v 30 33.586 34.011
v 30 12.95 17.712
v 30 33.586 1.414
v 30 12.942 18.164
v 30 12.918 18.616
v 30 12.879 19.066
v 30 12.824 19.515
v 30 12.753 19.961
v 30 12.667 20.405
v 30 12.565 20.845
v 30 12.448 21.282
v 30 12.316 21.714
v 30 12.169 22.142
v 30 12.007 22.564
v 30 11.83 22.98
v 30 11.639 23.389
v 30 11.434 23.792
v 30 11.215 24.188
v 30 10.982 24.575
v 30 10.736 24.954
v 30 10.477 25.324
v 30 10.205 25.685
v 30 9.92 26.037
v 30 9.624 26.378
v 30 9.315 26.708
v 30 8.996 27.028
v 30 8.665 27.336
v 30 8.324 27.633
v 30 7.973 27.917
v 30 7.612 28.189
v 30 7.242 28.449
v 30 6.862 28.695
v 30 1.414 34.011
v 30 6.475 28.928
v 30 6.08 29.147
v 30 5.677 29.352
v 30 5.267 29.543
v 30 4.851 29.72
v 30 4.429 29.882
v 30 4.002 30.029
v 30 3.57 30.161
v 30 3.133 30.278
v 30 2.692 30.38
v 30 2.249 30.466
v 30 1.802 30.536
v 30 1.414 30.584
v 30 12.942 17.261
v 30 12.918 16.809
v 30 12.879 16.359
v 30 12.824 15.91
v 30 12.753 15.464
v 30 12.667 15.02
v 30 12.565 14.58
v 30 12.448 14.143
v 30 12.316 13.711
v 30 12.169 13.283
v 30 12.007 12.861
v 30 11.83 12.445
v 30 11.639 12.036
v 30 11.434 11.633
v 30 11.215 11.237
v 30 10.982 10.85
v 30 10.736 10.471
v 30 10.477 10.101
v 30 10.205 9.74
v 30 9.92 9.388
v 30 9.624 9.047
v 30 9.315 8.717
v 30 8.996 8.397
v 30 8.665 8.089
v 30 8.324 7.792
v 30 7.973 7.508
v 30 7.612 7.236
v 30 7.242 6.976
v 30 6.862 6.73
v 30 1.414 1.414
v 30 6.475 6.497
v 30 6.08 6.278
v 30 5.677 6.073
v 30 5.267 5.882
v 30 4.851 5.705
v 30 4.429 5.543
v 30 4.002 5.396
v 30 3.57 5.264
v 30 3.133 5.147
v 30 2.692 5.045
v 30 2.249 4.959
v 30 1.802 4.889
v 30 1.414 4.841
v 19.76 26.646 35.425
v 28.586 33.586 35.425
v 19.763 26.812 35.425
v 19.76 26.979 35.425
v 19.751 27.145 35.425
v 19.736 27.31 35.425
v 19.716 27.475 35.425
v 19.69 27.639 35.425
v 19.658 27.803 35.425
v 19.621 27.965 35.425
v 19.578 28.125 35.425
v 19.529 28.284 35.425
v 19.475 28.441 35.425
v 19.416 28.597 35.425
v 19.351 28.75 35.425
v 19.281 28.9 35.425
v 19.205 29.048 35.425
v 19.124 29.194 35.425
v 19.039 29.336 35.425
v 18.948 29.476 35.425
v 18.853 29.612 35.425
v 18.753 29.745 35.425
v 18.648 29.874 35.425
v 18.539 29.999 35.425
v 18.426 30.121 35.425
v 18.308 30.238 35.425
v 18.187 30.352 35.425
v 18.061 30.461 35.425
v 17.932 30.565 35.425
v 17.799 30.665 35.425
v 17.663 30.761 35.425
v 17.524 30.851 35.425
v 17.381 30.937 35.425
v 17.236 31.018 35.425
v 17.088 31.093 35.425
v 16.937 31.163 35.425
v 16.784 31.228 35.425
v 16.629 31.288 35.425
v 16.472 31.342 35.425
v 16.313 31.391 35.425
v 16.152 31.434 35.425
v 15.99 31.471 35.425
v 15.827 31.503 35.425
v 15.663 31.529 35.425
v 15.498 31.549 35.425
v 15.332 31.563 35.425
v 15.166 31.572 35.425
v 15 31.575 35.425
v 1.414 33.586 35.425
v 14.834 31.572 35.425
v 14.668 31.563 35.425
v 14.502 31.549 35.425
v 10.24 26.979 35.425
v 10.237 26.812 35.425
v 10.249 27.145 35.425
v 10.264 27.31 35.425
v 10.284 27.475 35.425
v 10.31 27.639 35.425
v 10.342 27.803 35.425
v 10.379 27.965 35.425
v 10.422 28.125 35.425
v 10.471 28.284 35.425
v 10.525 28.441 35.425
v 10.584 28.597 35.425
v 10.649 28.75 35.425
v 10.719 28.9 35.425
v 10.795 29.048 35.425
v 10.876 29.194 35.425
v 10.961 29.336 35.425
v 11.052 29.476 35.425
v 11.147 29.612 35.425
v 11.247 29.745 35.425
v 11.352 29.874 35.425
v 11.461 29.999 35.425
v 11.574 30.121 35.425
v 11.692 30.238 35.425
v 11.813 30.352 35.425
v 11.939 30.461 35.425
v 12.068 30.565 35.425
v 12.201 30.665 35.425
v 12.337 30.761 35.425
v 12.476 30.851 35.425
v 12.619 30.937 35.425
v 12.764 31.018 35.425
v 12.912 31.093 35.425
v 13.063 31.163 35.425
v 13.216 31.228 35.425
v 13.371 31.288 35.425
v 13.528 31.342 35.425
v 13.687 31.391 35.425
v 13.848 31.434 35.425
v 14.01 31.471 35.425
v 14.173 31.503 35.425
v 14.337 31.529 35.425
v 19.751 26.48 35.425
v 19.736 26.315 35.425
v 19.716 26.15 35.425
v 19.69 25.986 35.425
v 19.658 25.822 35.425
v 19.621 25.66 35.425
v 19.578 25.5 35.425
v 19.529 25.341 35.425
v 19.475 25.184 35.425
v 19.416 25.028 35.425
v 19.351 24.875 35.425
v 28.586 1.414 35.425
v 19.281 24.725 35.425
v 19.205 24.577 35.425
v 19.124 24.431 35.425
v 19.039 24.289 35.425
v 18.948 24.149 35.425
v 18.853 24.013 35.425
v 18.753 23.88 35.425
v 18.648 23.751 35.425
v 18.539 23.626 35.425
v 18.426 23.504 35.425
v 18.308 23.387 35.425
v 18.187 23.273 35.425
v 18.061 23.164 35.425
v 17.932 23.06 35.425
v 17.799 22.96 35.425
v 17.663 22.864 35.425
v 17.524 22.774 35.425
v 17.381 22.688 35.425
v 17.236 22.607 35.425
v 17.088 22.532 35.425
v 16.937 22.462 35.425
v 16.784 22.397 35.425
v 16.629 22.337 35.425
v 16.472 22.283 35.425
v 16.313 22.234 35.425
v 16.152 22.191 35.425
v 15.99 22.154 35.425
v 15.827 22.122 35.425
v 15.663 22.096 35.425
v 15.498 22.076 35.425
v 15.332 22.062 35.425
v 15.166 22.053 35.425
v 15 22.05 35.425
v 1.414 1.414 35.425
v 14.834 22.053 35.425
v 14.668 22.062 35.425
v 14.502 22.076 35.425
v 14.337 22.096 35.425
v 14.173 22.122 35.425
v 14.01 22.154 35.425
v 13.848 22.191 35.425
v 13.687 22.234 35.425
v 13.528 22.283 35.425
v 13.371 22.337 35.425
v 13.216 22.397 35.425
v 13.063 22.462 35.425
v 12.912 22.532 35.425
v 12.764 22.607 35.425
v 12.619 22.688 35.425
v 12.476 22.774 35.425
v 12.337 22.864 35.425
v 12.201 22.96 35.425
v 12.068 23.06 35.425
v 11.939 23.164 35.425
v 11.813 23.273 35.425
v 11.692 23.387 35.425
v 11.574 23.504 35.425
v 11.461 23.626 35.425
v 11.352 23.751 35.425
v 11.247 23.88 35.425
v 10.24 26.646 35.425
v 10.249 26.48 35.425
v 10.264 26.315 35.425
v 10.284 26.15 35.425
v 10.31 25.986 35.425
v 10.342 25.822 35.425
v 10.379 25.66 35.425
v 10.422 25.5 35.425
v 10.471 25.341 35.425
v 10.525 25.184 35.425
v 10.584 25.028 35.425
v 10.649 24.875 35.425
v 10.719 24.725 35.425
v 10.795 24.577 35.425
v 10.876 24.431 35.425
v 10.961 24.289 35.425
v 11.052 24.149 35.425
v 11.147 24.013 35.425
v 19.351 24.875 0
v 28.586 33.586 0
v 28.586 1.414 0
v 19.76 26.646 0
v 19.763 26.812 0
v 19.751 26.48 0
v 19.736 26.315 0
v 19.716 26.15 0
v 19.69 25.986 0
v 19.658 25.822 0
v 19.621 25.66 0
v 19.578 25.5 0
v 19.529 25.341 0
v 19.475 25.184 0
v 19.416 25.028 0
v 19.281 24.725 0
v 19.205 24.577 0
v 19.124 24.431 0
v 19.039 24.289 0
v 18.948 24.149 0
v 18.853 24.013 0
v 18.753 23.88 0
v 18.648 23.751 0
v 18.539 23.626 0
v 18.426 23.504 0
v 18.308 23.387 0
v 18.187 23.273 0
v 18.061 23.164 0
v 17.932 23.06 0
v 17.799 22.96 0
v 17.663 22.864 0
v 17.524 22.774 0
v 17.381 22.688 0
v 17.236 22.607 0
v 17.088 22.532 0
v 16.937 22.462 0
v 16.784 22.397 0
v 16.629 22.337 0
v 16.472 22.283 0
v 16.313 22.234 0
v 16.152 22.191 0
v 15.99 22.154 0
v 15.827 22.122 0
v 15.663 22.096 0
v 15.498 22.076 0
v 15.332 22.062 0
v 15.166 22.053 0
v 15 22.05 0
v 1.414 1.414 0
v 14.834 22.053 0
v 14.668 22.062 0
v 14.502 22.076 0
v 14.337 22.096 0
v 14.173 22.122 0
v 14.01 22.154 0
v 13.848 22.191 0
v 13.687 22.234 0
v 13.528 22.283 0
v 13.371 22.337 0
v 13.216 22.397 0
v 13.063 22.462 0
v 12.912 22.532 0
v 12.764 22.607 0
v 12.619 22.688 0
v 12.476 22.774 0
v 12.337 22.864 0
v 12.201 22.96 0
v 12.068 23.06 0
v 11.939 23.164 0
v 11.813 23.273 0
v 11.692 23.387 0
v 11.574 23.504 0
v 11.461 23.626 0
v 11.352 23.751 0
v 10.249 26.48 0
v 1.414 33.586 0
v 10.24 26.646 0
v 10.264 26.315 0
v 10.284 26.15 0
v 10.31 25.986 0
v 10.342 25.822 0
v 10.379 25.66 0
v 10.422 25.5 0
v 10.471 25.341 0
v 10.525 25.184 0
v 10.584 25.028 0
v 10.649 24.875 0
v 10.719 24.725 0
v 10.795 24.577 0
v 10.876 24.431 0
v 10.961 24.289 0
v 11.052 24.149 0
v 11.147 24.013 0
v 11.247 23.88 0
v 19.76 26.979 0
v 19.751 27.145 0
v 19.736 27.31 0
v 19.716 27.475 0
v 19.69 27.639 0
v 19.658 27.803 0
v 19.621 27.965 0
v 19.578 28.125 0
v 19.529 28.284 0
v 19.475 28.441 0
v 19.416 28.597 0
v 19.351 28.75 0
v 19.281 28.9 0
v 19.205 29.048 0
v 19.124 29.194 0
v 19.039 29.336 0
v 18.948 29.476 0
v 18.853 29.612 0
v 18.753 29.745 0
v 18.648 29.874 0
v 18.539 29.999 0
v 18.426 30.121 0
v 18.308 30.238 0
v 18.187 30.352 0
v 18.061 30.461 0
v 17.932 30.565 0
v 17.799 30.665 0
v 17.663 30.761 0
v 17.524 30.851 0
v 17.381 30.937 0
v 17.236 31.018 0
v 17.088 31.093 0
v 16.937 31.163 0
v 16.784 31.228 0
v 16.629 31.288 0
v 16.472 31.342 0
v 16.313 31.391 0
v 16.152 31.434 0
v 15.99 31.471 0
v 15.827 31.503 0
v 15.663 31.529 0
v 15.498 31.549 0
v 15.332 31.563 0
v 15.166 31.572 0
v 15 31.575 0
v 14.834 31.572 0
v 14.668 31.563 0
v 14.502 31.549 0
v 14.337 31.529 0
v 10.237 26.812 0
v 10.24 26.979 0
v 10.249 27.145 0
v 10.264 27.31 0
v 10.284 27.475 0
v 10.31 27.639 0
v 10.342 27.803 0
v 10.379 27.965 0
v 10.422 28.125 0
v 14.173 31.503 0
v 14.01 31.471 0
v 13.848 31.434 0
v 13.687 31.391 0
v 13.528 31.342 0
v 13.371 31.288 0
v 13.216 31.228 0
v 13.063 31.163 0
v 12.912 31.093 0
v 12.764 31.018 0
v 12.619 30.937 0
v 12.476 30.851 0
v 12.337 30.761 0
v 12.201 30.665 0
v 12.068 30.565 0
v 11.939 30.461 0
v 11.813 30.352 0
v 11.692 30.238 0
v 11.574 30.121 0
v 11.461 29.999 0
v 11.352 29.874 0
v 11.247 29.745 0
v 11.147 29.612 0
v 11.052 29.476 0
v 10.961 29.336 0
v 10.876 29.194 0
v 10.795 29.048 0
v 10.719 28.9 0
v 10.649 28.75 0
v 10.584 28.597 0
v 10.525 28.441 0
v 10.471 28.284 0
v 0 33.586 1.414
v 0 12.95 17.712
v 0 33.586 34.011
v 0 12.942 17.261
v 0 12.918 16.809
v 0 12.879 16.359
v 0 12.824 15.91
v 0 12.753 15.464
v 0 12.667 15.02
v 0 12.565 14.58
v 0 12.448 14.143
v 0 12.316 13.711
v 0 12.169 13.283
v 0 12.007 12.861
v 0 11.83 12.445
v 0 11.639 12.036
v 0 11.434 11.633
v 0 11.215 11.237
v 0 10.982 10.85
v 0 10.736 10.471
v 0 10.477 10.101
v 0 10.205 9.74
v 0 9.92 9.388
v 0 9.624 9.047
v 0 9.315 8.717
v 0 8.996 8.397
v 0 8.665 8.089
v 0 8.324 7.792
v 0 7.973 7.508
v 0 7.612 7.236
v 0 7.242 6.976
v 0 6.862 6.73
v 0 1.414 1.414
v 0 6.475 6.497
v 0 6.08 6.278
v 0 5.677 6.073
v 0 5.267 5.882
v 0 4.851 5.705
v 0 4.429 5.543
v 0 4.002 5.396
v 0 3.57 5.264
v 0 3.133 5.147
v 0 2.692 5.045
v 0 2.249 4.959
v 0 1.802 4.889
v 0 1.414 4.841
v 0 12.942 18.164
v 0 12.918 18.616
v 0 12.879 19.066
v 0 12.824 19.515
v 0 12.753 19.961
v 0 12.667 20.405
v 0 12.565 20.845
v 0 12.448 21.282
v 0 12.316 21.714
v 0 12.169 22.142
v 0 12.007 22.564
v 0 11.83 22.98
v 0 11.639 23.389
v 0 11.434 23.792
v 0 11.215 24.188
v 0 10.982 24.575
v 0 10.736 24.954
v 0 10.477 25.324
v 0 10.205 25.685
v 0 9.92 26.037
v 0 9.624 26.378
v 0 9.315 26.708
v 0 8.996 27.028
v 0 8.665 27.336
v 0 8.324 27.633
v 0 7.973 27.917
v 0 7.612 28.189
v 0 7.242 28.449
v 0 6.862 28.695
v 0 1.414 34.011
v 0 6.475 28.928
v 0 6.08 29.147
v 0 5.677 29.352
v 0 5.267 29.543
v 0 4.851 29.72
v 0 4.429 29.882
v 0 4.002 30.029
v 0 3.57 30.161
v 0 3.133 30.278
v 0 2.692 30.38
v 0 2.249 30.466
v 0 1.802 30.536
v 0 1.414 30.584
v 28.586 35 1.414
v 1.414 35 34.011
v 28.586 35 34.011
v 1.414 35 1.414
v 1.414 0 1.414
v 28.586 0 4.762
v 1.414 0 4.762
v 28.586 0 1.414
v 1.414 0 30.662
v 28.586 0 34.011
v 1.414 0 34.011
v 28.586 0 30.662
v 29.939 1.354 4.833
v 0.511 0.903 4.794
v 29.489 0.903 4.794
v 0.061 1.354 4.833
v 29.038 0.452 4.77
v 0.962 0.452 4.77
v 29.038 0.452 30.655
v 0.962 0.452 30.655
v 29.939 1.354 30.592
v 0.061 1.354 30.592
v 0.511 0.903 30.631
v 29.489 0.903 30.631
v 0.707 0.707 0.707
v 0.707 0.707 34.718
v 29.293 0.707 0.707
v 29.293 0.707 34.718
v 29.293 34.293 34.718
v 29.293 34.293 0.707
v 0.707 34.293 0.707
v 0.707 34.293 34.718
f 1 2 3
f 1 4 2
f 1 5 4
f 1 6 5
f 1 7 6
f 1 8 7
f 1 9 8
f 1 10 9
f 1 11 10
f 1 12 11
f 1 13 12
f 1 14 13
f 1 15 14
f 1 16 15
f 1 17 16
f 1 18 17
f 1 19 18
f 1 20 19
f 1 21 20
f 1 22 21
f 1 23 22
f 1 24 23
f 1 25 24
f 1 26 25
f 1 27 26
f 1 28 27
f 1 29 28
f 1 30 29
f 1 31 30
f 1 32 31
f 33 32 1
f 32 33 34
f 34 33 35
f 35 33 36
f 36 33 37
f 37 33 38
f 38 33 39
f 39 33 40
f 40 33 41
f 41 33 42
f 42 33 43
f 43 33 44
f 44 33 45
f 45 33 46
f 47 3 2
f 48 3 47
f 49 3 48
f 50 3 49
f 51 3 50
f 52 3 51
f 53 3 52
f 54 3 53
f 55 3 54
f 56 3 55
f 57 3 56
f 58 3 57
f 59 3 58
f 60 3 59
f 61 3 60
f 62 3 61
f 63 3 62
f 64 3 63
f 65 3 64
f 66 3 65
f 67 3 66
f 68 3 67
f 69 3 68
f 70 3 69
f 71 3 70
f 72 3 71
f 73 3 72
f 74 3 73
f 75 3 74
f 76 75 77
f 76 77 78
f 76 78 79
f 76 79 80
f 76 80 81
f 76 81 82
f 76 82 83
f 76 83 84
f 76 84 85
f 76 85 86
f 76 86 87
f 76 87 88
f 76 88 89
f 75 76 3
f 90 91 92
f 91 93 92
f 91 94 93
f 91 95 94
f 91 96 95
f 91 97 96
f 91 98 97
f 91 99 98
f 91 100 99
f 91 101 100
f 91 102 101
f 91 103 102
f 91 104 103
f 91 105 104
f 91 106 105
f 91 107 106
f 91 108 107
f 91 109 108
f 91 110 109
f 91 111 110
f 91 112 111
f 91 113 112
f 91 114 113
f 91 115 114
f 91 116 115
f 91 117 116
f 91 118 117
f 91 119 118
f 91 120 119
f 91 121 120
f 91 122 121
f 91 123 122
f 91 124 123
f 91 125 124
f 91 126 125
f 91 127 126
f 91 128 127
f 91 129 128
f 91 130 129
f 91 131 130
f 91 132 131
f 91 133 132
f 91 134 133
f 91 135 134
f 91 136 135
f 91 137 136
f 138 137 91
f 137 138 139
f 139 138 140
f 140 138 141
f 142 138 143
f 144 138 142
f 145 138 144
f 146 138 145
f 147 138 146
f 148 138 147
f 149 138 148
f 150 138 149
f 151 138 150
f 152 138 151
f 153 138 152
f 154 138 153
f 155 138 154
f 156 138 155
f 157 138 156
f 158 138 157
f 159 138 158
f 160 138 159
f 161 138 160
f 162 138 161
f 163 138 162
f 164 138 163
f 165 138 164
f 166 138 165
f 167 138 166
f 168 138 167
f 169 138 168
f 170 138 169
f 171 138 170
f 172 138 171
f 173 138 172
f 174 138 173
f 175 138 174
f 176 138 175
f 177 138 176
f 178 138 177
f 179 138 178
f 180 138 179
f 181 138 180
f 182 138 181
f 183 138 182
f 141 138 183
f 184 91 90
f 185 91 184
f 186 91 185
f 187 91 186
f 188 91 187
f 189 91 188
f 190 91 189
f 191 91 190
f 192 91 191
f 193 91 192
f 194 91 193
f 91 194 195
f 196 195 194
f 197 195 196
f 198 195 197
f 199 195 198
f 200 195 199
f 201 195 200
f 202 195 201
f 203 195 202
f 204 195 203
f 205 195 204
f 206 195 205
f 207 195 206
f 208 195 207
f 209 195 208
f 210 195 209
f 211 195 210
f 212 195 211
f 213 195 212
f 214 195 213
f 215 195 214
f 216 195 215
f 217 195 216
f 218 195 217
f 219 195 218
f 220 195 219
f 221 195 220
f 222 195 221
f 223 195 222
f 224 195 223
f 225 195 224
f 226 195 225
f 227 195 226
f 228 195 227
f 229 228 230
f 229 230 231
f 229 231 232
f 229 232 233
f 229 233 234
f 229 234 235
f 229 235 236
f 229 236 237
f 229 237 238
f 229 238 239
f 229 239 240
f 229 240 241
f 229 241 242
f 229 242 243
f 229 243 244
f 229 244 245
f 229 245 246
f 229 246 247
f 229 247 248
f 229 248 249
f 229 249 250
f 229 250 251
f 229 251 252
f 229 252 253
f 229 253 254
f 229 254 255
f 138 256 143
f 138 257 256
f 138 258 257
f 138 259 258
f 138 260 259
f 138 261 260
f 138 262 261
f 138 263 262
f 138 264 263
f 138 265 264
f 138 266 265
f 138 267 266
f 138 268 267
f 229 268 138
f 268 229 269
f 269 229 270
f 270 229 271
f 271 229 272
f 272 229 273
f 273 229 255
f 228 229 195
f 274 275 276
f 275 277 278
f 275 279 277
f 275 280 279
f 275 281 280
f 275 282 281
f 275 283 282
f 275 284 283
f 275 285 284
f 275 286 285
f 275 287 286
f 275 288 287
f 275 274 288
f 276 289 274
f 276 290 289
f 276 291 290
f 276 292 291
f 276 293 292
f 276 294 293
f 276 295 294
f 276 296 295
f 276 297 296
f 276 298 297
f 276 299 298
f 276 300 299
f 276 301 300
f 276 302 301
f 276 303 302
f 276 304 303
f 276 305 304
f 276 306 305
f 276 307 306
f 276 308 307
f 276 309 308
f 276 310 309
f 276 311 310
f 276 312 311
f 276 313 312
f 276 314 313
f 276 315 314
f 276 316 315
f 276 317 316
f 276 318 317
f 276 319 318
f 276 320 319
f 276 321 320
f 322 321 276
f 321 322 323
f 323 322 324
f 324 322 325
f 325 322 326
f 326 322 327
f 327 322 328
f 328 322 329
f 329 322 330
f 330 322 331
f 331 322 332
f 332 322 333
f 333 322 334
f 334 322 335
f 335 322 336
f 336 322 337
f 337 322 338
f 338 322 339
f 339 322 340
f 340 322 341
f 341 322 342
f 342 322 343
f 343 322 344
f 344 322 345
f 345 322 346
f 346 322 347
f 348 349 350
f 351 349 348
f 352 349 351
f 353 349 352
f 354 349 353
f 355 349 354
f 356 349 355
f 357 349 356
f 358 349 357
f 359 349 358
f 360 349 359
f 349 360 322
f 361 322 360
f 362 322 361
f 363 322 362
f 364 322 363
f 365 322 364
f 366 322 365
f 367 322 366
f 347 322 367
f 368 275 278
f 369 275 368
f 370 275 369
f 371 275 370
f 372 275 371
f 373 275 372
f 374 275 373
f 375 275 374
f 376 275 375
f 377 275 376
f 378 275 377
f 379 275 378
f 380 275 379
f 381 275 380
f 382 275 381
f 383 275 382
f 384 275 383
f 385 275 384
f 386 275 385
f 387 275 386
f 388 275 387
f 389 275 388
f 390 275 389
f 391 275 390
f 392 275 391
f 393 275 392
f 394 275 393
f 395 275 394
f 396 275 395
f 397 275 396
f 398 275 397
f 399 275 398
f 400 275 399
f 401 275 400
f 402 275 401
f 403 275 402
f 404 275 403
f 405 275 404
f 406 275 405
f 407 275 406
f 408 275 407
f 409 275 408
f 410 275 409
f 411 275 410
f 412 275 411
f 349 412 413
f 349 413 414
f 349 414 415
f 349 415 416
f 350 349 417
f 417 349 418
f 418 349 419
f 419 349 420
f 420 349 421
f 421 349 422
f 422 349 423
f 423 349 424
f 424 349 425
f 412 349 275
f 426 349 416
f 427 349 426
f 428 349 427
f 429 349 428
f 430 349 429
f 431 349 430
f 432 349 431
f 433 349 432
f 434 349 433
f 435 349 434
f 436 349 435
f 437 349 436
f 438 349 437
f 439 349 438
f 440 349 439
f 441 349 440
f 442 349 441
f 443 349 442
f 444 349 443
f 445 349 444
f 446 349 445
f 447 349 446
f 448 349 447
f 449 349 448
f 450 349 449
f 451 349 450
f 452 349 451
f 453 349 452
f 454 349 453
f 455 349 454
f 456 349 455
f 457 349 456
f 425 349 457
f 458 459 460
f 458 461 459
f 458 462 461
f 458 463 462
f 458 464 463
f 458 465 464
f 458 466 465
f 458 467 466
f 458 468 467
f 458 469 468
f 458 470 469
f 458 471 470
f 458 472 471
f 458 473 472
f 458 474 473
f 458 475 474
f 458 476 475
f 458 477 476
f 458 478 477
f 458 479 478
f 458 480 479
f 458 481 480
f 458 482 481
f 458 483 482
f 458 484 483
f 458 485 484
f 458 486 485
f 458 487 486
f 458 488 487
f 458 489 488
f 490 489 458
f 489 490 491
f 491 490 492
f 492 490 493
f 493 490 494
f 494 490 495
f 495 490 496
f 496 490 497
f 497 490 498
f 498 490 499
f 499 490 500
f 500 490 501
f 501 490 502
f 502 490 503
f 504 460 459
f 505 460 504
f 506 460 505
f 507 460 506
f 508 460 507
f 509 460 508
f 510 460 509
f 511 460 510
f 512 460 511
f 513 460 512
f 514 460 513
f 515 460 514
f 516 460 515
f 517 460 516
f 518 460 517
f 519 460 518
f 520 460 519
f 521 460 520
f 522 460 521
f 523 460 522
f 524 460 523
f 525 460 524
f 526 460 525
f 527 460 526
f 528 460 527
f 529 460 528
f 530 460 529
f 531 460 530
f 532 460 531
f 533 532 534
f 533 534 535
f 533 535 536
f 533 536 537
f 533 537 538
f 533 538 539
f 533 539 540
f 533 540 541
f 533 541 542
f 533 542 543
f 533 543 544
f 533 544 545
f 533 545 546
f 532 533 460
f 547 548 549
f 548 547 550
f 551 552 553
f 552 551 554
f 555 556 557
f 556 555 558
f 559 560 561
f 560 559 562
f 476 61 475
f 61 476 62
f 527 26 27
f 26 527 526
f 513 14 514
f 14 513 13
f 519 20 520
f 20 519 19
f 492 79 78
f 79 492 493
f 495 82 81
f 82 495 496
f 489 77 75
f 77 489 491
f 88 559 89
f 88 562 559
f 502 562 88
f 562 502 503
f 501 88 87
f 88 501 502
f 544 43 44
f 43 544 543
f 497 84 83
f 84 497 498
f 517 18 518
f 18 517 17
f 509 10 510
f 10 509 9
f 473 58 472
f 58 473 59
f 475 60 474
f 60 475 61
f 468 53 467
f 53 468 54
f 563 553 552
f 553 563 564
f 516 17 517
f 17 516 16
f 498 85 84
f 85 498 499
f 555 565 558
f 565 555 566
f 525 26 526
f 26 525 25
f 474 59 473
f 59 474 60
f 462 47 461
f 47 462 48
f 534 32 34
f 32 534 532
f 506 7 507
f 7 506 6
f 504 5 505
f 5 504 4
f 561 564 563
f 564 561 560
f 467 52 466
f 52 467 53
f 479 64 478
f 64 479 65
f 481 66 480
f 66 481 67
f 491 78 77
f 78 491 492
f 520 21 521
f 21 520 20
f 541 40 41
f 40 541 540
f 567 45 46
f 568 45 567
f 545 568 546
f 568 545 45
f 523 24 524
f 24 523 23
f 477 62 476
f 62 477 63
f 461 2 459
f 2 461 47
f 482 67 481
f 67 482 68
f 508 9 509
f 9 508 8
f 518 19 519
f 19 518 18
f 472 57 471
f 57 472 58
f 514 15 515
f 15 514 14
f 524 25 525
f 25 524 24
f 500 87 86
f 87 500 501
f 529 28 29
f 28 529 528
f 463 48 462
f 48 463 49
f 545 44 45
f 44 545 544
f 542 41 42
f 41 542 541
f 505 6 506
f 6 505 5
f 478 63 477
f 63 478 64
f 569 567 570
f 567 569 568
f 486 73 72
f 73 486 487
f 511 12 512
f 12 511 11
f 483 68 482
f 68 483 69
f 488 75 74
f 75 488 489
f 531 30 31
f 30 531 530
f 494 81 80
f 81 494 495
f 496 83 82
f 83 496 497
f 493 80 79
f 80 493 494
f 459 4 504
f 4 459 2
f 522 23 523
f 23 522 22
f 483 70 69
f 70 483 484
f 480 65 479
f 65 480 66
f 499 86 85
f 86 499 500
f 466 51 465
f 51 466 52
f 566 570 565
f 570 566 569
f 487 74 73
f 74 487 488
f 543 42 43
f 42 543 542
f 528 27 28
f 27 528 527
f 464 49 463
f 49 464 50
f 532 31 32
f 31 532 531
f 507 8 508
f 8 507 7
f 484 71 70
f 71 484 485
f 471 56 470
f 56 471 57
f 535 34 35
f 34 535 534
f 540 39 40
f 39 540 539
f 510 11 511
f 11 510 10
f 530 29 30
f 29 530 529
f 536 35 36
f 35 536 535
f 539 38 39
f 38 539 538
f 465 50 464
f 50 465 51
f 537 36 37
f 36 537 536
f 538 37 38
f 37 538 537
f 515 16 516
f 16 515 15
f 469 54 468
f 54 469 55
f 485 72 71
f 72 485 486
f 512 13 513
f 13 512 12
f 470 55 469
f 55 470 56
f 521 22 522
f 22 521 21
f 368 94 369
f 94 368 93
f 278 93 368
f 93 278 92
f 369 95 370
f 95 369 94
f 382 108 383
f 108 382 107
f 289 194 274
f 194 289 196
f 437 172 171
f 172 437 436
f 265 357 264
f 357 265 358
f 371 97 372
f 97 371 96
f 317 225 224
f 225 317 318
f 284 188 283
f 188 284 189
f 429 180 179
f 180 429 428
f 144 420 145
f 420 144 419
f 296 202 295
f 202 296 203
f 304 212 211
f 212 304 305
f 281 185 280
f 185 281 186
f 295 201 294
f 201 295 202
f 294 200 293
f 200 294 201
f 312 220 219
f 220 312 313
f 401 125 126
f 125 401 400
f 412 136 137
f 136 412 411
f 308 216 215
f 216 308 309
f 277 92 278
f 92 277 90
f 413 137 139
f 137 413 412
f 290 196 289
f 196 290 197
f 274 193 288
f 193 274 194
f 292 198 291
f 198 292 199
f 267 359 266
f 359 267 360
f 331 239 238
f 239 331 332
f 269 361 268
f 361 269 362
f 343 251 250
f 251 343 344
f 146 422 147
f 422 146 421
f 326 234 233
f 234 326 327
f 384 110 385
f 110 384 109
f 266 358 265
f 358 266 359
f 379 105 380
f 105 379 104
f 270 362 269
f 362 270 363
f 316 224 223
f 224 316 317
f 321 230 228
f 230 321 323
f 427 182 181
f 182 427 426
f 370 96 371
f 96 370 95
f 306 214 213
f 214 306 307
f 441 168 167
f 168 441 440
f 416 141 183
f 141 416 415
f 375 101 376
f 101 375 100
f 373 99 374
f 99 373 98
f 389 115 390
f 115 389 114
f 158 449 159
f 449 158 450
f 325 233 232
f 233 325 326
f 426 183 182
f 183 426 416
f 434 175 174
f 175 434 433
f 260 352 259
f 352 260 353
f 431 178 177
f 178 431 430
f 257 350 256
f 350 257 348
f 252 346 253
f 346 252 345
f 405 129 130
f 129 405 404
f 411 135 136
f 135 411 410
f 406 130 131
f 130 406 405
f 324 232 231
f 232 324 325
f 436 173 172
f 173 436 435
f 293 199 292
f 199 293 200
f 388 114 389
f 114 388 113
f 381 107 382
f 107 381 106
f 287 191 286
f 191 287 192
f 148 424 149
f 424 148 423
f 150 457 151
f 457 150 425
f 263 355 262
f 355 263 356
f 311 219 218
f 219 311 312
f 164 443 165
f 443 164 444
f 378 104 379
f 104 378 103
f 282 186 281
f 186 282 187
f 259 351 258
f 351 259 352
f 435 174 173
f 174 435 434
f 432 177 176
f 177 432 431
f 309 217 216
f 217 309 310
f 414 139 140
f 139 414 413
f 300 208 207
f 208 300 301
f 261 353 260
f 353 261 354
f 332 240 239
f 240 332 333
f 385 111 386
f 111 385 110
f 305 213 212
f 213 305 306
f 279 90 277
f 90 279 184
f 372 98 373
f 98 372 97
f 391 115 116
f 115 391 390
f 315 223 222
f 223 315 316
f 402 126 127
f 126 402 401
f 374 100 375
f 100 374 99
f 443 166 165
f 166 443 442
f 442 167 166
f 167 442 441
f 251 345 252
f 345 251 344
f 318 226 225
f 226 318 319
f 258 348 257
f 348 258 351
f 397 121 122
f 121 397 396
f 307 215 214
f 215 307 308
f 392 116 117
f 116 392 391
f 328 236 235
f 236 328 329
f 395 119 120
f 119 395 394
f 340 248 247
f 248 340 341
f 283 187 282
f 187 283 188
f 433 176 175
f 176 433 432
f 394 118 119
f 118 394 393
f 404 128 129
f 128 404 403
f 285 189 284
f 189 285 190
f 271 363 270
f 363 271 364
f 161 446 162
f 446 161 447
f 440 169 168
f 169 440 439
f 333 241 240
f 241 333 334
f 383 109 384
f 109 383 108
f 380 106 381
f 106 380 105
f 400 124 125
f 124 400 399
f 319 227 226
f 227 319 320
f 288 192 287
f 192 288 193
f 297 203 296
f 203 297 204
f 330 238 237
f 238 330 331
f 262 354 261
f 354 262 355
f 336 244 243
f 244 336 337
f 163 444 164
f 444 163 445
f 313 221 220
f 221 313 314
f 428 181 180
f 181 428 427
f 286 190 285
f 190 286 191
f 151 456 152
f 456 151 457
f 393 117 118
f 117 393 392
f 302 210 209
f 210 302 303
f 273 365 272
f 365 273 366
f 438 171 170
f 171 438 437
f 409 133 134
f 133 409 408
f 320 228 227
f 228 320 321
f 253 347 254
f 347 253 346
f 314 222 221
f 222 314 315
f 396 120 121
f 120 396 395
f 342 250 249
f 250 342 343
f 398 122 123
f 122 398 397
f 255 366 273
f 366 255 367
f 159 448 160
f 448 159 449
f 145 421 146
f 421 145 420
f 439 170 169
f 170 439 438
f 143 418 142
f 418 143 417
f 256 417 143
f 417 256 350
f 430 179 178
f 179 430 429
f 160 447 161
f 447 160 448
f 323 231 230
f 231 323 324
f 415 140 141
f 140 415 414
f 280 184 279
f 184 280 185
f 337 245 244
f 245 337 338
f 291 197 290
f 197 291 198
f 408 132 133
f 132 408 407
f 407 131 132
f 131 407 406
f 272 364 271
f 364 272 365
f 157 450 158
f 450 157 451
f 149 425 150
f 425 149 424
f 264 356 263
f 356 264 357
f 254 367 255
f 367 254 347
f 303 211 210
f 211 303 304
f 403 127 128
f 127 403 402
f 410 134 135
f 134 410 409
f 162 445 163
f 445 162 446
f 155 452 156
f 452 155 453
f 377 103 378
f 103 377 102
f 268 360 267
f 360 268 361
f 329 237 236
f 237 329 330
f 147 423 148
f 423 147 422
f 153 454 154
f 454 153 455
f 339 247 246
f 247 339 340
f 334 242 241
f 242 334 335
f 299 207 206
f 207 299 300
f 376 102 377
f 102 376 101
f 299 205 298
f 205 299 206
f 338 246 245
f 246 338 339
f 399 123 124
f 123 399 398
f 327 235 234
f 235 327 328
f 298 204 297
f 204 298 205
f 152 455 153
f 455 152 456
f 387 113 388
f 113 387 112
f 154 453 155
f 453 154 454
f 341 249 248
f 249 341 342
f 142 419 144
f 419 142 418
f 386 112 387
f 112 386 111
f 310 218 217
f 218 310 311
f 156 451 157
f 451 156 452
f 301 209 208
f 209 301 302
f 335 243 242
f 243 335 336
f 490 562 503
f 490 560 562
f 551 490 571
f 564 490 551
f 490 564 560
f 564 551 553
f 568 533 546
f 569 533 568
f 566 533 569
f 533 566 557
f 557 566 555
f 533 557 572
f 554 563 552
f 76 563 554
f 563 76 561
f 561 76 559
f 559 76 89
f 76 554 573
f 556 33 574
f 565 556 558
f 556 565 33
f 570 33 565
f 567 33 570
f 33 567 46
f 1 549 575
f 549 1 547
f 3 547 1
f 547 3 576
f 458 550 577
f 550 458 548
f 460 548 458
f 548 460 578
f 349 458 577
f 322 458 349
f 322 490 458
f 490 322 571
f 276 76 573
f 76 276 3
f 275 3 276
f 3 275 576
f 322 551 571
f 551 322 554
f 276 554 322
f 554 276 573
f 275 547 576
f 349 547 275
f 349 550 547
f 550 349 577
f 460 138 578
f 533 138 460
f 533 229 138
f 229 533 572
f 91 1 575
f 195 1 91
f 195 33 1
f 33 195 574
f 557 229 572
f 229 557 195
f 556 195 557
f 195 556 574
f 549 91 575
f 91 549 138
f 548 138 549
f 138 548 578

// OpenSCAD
$fn          = 180;     // Number of fragments
pipe_od      = 25.9;    // OD of MaxLine (1" + 0.02" printing fudge factor)
lip          =  4.7625; // Extra lip on either side is 3/16"
block_x      = 30;      // Block width
block_y      = 35;      // Block depth
axle         =  9.525;  // 3/8" screw for axle
chamfer      =  2;      // Edge chamfer in mm

block_height = pipe_od + (lip * 2);

function hypotenuse (a, b) = sqrt ((a * a) + (b * b));

module block () {
  difference () {
    cube ([block_x, block_y, block_height]);
    translate ([-0.01, 0, block_height / 2])
      rotate ([0, 90, 0])
        cylinder (d = pipe_od, h = block_x + (0.01 * 2));
    translate ([block_x / 2, (block_y - (pipe_od / 2)) + (axle / 2), -0.01])
      cylinder (d = axle, h = block_height + (0.01 * 2));
  }
}

module vertical_chamfer () {
  x = [[0, -(hypotenuse (chamfer, chamfer) / 2)],
       [block_x + (hypotenuse (chamfer, chamfer) / 2), 0],
       [block_x, block_y + (hypotenuse (chamfer, chamfer) / 2)],
       [-(hypotenuse (chamfer, chamfer) / 2), block_y]
      ];

  for (i = [0:3])
    translate ([x [i][0], x [i][1], -0.01])
      rotate ([0, 0, (i * 90) + 45])
        cube ([chamfer, chamfer, block_height + 0.02]);
}

module horizontal_chamfer (z) {
  x = [[[0, -0.01, z + (hypotenuse (chamfer, chamfer) / 2)], [270, 0, 0], block_y],
       [[block_x, -0.01, z + (hypotenuse (chamfer, chamfer) / 2)], [270, 0, 0], block_y],
       [[block_x + 0.01, -(hypotenuse (chamfer, chamfer) / 2), z], [0, 270, 0], block_x],
       [[block_x + 0.01, block_y - (hypotenuse (chamfer, chamfer) / 2), z], [0, 270, 0], block_x]
      ];

  for (i = [0:3])
    translate (x [i][0])
      rotate (x [i][1])
        rotate ([0, 0, 45])
          cube ([chamfer, chamfer, x[i][2] + 0.02]);
}

module chamfer () {
  vertical_chamfer ();
  horizontal_chamfer (0);
  horizontal_chamfer (block_height);
}

difference () {
  block ();
  chamfer ();
}
